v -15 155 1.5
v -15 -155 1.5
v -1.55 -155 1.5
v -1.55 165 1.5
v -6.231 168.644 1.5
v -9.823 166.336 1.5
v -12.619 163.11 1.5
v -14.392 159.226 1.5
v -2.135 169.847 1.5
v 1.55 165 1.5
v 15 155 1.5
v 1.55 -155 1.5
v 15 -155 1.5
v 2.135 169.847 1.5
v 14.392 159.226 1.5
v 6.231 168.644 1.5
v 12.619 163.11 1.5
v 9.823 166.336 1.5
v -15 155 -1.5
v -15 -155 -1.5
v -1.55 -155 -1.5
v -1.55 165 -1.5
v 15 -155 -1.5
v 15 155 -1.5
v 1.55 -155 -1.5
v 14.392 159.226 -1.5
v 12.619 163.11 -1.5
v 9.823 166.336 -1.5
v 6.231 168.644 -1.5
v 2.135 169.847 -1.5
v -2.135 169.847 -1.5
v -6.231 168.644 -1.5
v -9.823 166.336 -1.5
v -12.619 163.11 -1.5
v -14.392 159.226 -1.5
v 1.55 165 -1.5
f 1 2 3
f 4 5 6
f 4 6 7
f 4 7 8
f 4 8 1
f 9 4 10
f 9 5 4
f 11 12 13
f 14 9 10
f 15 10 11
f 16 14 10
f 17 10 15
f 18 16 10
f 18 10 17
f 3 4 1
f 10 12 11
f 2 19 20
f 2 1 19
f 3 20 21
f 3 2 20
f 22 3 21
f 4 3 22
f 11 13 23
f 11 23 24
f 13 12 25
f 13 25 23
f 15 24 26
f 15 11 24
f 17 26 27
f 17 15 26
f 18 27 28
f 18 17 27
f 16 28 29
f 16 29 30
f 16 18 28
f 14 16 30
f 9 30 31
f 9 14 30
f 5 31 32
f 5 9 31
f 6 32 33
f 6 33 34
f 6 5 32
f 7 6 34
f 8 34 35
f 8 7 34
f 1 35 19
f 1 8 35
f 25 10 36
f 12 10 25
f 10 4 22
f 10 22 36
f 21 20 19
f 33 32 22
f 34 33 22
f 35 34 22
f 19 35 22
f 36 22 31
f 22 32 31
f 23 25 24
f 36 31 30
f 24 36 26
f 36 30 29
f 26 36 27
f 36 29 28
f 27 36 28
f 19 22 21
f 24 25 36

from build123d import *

# Parameters (mm, degrees)
BOSS_EXTRUDE1_DEPTH = 1.5


with BuildPart() as part:
    # Sketch2 → Boss-Extrude1 (new body, symmetric)
    with BuildSketch(Plane.XY):
        with BuildLine():
            Line((-15.000000098, -155.000001017), (-1.550000098, -155.000001017))
            Line((-1.550000098, -155.000001017), (-1.550000098, 164.999998983))
            Line((-1.550000098, 164.999998983), (1.549999902, 164.999998983))
            Line((1.549999902, 164.999998983), (1.549999902, -155.000001017))
            Line((1.549999902, -155.000001017), (14.999999902, -155.000001017))
            Line((14.999999902, -155.000001017), (14.999999902, 154.999998983))
            ThreePointArc((14.999999902, 154.999998983), (1.936e-06, 170.000001017), (-15.000000098, 155.000003052))
            Line((-15.000000098, 155.000003052), (-15.000000098, -155.000001017))
        make_face()
    extrude(amount=BOSS_EXTRUDE1_DEPTH, both=True)


solid = part.part
